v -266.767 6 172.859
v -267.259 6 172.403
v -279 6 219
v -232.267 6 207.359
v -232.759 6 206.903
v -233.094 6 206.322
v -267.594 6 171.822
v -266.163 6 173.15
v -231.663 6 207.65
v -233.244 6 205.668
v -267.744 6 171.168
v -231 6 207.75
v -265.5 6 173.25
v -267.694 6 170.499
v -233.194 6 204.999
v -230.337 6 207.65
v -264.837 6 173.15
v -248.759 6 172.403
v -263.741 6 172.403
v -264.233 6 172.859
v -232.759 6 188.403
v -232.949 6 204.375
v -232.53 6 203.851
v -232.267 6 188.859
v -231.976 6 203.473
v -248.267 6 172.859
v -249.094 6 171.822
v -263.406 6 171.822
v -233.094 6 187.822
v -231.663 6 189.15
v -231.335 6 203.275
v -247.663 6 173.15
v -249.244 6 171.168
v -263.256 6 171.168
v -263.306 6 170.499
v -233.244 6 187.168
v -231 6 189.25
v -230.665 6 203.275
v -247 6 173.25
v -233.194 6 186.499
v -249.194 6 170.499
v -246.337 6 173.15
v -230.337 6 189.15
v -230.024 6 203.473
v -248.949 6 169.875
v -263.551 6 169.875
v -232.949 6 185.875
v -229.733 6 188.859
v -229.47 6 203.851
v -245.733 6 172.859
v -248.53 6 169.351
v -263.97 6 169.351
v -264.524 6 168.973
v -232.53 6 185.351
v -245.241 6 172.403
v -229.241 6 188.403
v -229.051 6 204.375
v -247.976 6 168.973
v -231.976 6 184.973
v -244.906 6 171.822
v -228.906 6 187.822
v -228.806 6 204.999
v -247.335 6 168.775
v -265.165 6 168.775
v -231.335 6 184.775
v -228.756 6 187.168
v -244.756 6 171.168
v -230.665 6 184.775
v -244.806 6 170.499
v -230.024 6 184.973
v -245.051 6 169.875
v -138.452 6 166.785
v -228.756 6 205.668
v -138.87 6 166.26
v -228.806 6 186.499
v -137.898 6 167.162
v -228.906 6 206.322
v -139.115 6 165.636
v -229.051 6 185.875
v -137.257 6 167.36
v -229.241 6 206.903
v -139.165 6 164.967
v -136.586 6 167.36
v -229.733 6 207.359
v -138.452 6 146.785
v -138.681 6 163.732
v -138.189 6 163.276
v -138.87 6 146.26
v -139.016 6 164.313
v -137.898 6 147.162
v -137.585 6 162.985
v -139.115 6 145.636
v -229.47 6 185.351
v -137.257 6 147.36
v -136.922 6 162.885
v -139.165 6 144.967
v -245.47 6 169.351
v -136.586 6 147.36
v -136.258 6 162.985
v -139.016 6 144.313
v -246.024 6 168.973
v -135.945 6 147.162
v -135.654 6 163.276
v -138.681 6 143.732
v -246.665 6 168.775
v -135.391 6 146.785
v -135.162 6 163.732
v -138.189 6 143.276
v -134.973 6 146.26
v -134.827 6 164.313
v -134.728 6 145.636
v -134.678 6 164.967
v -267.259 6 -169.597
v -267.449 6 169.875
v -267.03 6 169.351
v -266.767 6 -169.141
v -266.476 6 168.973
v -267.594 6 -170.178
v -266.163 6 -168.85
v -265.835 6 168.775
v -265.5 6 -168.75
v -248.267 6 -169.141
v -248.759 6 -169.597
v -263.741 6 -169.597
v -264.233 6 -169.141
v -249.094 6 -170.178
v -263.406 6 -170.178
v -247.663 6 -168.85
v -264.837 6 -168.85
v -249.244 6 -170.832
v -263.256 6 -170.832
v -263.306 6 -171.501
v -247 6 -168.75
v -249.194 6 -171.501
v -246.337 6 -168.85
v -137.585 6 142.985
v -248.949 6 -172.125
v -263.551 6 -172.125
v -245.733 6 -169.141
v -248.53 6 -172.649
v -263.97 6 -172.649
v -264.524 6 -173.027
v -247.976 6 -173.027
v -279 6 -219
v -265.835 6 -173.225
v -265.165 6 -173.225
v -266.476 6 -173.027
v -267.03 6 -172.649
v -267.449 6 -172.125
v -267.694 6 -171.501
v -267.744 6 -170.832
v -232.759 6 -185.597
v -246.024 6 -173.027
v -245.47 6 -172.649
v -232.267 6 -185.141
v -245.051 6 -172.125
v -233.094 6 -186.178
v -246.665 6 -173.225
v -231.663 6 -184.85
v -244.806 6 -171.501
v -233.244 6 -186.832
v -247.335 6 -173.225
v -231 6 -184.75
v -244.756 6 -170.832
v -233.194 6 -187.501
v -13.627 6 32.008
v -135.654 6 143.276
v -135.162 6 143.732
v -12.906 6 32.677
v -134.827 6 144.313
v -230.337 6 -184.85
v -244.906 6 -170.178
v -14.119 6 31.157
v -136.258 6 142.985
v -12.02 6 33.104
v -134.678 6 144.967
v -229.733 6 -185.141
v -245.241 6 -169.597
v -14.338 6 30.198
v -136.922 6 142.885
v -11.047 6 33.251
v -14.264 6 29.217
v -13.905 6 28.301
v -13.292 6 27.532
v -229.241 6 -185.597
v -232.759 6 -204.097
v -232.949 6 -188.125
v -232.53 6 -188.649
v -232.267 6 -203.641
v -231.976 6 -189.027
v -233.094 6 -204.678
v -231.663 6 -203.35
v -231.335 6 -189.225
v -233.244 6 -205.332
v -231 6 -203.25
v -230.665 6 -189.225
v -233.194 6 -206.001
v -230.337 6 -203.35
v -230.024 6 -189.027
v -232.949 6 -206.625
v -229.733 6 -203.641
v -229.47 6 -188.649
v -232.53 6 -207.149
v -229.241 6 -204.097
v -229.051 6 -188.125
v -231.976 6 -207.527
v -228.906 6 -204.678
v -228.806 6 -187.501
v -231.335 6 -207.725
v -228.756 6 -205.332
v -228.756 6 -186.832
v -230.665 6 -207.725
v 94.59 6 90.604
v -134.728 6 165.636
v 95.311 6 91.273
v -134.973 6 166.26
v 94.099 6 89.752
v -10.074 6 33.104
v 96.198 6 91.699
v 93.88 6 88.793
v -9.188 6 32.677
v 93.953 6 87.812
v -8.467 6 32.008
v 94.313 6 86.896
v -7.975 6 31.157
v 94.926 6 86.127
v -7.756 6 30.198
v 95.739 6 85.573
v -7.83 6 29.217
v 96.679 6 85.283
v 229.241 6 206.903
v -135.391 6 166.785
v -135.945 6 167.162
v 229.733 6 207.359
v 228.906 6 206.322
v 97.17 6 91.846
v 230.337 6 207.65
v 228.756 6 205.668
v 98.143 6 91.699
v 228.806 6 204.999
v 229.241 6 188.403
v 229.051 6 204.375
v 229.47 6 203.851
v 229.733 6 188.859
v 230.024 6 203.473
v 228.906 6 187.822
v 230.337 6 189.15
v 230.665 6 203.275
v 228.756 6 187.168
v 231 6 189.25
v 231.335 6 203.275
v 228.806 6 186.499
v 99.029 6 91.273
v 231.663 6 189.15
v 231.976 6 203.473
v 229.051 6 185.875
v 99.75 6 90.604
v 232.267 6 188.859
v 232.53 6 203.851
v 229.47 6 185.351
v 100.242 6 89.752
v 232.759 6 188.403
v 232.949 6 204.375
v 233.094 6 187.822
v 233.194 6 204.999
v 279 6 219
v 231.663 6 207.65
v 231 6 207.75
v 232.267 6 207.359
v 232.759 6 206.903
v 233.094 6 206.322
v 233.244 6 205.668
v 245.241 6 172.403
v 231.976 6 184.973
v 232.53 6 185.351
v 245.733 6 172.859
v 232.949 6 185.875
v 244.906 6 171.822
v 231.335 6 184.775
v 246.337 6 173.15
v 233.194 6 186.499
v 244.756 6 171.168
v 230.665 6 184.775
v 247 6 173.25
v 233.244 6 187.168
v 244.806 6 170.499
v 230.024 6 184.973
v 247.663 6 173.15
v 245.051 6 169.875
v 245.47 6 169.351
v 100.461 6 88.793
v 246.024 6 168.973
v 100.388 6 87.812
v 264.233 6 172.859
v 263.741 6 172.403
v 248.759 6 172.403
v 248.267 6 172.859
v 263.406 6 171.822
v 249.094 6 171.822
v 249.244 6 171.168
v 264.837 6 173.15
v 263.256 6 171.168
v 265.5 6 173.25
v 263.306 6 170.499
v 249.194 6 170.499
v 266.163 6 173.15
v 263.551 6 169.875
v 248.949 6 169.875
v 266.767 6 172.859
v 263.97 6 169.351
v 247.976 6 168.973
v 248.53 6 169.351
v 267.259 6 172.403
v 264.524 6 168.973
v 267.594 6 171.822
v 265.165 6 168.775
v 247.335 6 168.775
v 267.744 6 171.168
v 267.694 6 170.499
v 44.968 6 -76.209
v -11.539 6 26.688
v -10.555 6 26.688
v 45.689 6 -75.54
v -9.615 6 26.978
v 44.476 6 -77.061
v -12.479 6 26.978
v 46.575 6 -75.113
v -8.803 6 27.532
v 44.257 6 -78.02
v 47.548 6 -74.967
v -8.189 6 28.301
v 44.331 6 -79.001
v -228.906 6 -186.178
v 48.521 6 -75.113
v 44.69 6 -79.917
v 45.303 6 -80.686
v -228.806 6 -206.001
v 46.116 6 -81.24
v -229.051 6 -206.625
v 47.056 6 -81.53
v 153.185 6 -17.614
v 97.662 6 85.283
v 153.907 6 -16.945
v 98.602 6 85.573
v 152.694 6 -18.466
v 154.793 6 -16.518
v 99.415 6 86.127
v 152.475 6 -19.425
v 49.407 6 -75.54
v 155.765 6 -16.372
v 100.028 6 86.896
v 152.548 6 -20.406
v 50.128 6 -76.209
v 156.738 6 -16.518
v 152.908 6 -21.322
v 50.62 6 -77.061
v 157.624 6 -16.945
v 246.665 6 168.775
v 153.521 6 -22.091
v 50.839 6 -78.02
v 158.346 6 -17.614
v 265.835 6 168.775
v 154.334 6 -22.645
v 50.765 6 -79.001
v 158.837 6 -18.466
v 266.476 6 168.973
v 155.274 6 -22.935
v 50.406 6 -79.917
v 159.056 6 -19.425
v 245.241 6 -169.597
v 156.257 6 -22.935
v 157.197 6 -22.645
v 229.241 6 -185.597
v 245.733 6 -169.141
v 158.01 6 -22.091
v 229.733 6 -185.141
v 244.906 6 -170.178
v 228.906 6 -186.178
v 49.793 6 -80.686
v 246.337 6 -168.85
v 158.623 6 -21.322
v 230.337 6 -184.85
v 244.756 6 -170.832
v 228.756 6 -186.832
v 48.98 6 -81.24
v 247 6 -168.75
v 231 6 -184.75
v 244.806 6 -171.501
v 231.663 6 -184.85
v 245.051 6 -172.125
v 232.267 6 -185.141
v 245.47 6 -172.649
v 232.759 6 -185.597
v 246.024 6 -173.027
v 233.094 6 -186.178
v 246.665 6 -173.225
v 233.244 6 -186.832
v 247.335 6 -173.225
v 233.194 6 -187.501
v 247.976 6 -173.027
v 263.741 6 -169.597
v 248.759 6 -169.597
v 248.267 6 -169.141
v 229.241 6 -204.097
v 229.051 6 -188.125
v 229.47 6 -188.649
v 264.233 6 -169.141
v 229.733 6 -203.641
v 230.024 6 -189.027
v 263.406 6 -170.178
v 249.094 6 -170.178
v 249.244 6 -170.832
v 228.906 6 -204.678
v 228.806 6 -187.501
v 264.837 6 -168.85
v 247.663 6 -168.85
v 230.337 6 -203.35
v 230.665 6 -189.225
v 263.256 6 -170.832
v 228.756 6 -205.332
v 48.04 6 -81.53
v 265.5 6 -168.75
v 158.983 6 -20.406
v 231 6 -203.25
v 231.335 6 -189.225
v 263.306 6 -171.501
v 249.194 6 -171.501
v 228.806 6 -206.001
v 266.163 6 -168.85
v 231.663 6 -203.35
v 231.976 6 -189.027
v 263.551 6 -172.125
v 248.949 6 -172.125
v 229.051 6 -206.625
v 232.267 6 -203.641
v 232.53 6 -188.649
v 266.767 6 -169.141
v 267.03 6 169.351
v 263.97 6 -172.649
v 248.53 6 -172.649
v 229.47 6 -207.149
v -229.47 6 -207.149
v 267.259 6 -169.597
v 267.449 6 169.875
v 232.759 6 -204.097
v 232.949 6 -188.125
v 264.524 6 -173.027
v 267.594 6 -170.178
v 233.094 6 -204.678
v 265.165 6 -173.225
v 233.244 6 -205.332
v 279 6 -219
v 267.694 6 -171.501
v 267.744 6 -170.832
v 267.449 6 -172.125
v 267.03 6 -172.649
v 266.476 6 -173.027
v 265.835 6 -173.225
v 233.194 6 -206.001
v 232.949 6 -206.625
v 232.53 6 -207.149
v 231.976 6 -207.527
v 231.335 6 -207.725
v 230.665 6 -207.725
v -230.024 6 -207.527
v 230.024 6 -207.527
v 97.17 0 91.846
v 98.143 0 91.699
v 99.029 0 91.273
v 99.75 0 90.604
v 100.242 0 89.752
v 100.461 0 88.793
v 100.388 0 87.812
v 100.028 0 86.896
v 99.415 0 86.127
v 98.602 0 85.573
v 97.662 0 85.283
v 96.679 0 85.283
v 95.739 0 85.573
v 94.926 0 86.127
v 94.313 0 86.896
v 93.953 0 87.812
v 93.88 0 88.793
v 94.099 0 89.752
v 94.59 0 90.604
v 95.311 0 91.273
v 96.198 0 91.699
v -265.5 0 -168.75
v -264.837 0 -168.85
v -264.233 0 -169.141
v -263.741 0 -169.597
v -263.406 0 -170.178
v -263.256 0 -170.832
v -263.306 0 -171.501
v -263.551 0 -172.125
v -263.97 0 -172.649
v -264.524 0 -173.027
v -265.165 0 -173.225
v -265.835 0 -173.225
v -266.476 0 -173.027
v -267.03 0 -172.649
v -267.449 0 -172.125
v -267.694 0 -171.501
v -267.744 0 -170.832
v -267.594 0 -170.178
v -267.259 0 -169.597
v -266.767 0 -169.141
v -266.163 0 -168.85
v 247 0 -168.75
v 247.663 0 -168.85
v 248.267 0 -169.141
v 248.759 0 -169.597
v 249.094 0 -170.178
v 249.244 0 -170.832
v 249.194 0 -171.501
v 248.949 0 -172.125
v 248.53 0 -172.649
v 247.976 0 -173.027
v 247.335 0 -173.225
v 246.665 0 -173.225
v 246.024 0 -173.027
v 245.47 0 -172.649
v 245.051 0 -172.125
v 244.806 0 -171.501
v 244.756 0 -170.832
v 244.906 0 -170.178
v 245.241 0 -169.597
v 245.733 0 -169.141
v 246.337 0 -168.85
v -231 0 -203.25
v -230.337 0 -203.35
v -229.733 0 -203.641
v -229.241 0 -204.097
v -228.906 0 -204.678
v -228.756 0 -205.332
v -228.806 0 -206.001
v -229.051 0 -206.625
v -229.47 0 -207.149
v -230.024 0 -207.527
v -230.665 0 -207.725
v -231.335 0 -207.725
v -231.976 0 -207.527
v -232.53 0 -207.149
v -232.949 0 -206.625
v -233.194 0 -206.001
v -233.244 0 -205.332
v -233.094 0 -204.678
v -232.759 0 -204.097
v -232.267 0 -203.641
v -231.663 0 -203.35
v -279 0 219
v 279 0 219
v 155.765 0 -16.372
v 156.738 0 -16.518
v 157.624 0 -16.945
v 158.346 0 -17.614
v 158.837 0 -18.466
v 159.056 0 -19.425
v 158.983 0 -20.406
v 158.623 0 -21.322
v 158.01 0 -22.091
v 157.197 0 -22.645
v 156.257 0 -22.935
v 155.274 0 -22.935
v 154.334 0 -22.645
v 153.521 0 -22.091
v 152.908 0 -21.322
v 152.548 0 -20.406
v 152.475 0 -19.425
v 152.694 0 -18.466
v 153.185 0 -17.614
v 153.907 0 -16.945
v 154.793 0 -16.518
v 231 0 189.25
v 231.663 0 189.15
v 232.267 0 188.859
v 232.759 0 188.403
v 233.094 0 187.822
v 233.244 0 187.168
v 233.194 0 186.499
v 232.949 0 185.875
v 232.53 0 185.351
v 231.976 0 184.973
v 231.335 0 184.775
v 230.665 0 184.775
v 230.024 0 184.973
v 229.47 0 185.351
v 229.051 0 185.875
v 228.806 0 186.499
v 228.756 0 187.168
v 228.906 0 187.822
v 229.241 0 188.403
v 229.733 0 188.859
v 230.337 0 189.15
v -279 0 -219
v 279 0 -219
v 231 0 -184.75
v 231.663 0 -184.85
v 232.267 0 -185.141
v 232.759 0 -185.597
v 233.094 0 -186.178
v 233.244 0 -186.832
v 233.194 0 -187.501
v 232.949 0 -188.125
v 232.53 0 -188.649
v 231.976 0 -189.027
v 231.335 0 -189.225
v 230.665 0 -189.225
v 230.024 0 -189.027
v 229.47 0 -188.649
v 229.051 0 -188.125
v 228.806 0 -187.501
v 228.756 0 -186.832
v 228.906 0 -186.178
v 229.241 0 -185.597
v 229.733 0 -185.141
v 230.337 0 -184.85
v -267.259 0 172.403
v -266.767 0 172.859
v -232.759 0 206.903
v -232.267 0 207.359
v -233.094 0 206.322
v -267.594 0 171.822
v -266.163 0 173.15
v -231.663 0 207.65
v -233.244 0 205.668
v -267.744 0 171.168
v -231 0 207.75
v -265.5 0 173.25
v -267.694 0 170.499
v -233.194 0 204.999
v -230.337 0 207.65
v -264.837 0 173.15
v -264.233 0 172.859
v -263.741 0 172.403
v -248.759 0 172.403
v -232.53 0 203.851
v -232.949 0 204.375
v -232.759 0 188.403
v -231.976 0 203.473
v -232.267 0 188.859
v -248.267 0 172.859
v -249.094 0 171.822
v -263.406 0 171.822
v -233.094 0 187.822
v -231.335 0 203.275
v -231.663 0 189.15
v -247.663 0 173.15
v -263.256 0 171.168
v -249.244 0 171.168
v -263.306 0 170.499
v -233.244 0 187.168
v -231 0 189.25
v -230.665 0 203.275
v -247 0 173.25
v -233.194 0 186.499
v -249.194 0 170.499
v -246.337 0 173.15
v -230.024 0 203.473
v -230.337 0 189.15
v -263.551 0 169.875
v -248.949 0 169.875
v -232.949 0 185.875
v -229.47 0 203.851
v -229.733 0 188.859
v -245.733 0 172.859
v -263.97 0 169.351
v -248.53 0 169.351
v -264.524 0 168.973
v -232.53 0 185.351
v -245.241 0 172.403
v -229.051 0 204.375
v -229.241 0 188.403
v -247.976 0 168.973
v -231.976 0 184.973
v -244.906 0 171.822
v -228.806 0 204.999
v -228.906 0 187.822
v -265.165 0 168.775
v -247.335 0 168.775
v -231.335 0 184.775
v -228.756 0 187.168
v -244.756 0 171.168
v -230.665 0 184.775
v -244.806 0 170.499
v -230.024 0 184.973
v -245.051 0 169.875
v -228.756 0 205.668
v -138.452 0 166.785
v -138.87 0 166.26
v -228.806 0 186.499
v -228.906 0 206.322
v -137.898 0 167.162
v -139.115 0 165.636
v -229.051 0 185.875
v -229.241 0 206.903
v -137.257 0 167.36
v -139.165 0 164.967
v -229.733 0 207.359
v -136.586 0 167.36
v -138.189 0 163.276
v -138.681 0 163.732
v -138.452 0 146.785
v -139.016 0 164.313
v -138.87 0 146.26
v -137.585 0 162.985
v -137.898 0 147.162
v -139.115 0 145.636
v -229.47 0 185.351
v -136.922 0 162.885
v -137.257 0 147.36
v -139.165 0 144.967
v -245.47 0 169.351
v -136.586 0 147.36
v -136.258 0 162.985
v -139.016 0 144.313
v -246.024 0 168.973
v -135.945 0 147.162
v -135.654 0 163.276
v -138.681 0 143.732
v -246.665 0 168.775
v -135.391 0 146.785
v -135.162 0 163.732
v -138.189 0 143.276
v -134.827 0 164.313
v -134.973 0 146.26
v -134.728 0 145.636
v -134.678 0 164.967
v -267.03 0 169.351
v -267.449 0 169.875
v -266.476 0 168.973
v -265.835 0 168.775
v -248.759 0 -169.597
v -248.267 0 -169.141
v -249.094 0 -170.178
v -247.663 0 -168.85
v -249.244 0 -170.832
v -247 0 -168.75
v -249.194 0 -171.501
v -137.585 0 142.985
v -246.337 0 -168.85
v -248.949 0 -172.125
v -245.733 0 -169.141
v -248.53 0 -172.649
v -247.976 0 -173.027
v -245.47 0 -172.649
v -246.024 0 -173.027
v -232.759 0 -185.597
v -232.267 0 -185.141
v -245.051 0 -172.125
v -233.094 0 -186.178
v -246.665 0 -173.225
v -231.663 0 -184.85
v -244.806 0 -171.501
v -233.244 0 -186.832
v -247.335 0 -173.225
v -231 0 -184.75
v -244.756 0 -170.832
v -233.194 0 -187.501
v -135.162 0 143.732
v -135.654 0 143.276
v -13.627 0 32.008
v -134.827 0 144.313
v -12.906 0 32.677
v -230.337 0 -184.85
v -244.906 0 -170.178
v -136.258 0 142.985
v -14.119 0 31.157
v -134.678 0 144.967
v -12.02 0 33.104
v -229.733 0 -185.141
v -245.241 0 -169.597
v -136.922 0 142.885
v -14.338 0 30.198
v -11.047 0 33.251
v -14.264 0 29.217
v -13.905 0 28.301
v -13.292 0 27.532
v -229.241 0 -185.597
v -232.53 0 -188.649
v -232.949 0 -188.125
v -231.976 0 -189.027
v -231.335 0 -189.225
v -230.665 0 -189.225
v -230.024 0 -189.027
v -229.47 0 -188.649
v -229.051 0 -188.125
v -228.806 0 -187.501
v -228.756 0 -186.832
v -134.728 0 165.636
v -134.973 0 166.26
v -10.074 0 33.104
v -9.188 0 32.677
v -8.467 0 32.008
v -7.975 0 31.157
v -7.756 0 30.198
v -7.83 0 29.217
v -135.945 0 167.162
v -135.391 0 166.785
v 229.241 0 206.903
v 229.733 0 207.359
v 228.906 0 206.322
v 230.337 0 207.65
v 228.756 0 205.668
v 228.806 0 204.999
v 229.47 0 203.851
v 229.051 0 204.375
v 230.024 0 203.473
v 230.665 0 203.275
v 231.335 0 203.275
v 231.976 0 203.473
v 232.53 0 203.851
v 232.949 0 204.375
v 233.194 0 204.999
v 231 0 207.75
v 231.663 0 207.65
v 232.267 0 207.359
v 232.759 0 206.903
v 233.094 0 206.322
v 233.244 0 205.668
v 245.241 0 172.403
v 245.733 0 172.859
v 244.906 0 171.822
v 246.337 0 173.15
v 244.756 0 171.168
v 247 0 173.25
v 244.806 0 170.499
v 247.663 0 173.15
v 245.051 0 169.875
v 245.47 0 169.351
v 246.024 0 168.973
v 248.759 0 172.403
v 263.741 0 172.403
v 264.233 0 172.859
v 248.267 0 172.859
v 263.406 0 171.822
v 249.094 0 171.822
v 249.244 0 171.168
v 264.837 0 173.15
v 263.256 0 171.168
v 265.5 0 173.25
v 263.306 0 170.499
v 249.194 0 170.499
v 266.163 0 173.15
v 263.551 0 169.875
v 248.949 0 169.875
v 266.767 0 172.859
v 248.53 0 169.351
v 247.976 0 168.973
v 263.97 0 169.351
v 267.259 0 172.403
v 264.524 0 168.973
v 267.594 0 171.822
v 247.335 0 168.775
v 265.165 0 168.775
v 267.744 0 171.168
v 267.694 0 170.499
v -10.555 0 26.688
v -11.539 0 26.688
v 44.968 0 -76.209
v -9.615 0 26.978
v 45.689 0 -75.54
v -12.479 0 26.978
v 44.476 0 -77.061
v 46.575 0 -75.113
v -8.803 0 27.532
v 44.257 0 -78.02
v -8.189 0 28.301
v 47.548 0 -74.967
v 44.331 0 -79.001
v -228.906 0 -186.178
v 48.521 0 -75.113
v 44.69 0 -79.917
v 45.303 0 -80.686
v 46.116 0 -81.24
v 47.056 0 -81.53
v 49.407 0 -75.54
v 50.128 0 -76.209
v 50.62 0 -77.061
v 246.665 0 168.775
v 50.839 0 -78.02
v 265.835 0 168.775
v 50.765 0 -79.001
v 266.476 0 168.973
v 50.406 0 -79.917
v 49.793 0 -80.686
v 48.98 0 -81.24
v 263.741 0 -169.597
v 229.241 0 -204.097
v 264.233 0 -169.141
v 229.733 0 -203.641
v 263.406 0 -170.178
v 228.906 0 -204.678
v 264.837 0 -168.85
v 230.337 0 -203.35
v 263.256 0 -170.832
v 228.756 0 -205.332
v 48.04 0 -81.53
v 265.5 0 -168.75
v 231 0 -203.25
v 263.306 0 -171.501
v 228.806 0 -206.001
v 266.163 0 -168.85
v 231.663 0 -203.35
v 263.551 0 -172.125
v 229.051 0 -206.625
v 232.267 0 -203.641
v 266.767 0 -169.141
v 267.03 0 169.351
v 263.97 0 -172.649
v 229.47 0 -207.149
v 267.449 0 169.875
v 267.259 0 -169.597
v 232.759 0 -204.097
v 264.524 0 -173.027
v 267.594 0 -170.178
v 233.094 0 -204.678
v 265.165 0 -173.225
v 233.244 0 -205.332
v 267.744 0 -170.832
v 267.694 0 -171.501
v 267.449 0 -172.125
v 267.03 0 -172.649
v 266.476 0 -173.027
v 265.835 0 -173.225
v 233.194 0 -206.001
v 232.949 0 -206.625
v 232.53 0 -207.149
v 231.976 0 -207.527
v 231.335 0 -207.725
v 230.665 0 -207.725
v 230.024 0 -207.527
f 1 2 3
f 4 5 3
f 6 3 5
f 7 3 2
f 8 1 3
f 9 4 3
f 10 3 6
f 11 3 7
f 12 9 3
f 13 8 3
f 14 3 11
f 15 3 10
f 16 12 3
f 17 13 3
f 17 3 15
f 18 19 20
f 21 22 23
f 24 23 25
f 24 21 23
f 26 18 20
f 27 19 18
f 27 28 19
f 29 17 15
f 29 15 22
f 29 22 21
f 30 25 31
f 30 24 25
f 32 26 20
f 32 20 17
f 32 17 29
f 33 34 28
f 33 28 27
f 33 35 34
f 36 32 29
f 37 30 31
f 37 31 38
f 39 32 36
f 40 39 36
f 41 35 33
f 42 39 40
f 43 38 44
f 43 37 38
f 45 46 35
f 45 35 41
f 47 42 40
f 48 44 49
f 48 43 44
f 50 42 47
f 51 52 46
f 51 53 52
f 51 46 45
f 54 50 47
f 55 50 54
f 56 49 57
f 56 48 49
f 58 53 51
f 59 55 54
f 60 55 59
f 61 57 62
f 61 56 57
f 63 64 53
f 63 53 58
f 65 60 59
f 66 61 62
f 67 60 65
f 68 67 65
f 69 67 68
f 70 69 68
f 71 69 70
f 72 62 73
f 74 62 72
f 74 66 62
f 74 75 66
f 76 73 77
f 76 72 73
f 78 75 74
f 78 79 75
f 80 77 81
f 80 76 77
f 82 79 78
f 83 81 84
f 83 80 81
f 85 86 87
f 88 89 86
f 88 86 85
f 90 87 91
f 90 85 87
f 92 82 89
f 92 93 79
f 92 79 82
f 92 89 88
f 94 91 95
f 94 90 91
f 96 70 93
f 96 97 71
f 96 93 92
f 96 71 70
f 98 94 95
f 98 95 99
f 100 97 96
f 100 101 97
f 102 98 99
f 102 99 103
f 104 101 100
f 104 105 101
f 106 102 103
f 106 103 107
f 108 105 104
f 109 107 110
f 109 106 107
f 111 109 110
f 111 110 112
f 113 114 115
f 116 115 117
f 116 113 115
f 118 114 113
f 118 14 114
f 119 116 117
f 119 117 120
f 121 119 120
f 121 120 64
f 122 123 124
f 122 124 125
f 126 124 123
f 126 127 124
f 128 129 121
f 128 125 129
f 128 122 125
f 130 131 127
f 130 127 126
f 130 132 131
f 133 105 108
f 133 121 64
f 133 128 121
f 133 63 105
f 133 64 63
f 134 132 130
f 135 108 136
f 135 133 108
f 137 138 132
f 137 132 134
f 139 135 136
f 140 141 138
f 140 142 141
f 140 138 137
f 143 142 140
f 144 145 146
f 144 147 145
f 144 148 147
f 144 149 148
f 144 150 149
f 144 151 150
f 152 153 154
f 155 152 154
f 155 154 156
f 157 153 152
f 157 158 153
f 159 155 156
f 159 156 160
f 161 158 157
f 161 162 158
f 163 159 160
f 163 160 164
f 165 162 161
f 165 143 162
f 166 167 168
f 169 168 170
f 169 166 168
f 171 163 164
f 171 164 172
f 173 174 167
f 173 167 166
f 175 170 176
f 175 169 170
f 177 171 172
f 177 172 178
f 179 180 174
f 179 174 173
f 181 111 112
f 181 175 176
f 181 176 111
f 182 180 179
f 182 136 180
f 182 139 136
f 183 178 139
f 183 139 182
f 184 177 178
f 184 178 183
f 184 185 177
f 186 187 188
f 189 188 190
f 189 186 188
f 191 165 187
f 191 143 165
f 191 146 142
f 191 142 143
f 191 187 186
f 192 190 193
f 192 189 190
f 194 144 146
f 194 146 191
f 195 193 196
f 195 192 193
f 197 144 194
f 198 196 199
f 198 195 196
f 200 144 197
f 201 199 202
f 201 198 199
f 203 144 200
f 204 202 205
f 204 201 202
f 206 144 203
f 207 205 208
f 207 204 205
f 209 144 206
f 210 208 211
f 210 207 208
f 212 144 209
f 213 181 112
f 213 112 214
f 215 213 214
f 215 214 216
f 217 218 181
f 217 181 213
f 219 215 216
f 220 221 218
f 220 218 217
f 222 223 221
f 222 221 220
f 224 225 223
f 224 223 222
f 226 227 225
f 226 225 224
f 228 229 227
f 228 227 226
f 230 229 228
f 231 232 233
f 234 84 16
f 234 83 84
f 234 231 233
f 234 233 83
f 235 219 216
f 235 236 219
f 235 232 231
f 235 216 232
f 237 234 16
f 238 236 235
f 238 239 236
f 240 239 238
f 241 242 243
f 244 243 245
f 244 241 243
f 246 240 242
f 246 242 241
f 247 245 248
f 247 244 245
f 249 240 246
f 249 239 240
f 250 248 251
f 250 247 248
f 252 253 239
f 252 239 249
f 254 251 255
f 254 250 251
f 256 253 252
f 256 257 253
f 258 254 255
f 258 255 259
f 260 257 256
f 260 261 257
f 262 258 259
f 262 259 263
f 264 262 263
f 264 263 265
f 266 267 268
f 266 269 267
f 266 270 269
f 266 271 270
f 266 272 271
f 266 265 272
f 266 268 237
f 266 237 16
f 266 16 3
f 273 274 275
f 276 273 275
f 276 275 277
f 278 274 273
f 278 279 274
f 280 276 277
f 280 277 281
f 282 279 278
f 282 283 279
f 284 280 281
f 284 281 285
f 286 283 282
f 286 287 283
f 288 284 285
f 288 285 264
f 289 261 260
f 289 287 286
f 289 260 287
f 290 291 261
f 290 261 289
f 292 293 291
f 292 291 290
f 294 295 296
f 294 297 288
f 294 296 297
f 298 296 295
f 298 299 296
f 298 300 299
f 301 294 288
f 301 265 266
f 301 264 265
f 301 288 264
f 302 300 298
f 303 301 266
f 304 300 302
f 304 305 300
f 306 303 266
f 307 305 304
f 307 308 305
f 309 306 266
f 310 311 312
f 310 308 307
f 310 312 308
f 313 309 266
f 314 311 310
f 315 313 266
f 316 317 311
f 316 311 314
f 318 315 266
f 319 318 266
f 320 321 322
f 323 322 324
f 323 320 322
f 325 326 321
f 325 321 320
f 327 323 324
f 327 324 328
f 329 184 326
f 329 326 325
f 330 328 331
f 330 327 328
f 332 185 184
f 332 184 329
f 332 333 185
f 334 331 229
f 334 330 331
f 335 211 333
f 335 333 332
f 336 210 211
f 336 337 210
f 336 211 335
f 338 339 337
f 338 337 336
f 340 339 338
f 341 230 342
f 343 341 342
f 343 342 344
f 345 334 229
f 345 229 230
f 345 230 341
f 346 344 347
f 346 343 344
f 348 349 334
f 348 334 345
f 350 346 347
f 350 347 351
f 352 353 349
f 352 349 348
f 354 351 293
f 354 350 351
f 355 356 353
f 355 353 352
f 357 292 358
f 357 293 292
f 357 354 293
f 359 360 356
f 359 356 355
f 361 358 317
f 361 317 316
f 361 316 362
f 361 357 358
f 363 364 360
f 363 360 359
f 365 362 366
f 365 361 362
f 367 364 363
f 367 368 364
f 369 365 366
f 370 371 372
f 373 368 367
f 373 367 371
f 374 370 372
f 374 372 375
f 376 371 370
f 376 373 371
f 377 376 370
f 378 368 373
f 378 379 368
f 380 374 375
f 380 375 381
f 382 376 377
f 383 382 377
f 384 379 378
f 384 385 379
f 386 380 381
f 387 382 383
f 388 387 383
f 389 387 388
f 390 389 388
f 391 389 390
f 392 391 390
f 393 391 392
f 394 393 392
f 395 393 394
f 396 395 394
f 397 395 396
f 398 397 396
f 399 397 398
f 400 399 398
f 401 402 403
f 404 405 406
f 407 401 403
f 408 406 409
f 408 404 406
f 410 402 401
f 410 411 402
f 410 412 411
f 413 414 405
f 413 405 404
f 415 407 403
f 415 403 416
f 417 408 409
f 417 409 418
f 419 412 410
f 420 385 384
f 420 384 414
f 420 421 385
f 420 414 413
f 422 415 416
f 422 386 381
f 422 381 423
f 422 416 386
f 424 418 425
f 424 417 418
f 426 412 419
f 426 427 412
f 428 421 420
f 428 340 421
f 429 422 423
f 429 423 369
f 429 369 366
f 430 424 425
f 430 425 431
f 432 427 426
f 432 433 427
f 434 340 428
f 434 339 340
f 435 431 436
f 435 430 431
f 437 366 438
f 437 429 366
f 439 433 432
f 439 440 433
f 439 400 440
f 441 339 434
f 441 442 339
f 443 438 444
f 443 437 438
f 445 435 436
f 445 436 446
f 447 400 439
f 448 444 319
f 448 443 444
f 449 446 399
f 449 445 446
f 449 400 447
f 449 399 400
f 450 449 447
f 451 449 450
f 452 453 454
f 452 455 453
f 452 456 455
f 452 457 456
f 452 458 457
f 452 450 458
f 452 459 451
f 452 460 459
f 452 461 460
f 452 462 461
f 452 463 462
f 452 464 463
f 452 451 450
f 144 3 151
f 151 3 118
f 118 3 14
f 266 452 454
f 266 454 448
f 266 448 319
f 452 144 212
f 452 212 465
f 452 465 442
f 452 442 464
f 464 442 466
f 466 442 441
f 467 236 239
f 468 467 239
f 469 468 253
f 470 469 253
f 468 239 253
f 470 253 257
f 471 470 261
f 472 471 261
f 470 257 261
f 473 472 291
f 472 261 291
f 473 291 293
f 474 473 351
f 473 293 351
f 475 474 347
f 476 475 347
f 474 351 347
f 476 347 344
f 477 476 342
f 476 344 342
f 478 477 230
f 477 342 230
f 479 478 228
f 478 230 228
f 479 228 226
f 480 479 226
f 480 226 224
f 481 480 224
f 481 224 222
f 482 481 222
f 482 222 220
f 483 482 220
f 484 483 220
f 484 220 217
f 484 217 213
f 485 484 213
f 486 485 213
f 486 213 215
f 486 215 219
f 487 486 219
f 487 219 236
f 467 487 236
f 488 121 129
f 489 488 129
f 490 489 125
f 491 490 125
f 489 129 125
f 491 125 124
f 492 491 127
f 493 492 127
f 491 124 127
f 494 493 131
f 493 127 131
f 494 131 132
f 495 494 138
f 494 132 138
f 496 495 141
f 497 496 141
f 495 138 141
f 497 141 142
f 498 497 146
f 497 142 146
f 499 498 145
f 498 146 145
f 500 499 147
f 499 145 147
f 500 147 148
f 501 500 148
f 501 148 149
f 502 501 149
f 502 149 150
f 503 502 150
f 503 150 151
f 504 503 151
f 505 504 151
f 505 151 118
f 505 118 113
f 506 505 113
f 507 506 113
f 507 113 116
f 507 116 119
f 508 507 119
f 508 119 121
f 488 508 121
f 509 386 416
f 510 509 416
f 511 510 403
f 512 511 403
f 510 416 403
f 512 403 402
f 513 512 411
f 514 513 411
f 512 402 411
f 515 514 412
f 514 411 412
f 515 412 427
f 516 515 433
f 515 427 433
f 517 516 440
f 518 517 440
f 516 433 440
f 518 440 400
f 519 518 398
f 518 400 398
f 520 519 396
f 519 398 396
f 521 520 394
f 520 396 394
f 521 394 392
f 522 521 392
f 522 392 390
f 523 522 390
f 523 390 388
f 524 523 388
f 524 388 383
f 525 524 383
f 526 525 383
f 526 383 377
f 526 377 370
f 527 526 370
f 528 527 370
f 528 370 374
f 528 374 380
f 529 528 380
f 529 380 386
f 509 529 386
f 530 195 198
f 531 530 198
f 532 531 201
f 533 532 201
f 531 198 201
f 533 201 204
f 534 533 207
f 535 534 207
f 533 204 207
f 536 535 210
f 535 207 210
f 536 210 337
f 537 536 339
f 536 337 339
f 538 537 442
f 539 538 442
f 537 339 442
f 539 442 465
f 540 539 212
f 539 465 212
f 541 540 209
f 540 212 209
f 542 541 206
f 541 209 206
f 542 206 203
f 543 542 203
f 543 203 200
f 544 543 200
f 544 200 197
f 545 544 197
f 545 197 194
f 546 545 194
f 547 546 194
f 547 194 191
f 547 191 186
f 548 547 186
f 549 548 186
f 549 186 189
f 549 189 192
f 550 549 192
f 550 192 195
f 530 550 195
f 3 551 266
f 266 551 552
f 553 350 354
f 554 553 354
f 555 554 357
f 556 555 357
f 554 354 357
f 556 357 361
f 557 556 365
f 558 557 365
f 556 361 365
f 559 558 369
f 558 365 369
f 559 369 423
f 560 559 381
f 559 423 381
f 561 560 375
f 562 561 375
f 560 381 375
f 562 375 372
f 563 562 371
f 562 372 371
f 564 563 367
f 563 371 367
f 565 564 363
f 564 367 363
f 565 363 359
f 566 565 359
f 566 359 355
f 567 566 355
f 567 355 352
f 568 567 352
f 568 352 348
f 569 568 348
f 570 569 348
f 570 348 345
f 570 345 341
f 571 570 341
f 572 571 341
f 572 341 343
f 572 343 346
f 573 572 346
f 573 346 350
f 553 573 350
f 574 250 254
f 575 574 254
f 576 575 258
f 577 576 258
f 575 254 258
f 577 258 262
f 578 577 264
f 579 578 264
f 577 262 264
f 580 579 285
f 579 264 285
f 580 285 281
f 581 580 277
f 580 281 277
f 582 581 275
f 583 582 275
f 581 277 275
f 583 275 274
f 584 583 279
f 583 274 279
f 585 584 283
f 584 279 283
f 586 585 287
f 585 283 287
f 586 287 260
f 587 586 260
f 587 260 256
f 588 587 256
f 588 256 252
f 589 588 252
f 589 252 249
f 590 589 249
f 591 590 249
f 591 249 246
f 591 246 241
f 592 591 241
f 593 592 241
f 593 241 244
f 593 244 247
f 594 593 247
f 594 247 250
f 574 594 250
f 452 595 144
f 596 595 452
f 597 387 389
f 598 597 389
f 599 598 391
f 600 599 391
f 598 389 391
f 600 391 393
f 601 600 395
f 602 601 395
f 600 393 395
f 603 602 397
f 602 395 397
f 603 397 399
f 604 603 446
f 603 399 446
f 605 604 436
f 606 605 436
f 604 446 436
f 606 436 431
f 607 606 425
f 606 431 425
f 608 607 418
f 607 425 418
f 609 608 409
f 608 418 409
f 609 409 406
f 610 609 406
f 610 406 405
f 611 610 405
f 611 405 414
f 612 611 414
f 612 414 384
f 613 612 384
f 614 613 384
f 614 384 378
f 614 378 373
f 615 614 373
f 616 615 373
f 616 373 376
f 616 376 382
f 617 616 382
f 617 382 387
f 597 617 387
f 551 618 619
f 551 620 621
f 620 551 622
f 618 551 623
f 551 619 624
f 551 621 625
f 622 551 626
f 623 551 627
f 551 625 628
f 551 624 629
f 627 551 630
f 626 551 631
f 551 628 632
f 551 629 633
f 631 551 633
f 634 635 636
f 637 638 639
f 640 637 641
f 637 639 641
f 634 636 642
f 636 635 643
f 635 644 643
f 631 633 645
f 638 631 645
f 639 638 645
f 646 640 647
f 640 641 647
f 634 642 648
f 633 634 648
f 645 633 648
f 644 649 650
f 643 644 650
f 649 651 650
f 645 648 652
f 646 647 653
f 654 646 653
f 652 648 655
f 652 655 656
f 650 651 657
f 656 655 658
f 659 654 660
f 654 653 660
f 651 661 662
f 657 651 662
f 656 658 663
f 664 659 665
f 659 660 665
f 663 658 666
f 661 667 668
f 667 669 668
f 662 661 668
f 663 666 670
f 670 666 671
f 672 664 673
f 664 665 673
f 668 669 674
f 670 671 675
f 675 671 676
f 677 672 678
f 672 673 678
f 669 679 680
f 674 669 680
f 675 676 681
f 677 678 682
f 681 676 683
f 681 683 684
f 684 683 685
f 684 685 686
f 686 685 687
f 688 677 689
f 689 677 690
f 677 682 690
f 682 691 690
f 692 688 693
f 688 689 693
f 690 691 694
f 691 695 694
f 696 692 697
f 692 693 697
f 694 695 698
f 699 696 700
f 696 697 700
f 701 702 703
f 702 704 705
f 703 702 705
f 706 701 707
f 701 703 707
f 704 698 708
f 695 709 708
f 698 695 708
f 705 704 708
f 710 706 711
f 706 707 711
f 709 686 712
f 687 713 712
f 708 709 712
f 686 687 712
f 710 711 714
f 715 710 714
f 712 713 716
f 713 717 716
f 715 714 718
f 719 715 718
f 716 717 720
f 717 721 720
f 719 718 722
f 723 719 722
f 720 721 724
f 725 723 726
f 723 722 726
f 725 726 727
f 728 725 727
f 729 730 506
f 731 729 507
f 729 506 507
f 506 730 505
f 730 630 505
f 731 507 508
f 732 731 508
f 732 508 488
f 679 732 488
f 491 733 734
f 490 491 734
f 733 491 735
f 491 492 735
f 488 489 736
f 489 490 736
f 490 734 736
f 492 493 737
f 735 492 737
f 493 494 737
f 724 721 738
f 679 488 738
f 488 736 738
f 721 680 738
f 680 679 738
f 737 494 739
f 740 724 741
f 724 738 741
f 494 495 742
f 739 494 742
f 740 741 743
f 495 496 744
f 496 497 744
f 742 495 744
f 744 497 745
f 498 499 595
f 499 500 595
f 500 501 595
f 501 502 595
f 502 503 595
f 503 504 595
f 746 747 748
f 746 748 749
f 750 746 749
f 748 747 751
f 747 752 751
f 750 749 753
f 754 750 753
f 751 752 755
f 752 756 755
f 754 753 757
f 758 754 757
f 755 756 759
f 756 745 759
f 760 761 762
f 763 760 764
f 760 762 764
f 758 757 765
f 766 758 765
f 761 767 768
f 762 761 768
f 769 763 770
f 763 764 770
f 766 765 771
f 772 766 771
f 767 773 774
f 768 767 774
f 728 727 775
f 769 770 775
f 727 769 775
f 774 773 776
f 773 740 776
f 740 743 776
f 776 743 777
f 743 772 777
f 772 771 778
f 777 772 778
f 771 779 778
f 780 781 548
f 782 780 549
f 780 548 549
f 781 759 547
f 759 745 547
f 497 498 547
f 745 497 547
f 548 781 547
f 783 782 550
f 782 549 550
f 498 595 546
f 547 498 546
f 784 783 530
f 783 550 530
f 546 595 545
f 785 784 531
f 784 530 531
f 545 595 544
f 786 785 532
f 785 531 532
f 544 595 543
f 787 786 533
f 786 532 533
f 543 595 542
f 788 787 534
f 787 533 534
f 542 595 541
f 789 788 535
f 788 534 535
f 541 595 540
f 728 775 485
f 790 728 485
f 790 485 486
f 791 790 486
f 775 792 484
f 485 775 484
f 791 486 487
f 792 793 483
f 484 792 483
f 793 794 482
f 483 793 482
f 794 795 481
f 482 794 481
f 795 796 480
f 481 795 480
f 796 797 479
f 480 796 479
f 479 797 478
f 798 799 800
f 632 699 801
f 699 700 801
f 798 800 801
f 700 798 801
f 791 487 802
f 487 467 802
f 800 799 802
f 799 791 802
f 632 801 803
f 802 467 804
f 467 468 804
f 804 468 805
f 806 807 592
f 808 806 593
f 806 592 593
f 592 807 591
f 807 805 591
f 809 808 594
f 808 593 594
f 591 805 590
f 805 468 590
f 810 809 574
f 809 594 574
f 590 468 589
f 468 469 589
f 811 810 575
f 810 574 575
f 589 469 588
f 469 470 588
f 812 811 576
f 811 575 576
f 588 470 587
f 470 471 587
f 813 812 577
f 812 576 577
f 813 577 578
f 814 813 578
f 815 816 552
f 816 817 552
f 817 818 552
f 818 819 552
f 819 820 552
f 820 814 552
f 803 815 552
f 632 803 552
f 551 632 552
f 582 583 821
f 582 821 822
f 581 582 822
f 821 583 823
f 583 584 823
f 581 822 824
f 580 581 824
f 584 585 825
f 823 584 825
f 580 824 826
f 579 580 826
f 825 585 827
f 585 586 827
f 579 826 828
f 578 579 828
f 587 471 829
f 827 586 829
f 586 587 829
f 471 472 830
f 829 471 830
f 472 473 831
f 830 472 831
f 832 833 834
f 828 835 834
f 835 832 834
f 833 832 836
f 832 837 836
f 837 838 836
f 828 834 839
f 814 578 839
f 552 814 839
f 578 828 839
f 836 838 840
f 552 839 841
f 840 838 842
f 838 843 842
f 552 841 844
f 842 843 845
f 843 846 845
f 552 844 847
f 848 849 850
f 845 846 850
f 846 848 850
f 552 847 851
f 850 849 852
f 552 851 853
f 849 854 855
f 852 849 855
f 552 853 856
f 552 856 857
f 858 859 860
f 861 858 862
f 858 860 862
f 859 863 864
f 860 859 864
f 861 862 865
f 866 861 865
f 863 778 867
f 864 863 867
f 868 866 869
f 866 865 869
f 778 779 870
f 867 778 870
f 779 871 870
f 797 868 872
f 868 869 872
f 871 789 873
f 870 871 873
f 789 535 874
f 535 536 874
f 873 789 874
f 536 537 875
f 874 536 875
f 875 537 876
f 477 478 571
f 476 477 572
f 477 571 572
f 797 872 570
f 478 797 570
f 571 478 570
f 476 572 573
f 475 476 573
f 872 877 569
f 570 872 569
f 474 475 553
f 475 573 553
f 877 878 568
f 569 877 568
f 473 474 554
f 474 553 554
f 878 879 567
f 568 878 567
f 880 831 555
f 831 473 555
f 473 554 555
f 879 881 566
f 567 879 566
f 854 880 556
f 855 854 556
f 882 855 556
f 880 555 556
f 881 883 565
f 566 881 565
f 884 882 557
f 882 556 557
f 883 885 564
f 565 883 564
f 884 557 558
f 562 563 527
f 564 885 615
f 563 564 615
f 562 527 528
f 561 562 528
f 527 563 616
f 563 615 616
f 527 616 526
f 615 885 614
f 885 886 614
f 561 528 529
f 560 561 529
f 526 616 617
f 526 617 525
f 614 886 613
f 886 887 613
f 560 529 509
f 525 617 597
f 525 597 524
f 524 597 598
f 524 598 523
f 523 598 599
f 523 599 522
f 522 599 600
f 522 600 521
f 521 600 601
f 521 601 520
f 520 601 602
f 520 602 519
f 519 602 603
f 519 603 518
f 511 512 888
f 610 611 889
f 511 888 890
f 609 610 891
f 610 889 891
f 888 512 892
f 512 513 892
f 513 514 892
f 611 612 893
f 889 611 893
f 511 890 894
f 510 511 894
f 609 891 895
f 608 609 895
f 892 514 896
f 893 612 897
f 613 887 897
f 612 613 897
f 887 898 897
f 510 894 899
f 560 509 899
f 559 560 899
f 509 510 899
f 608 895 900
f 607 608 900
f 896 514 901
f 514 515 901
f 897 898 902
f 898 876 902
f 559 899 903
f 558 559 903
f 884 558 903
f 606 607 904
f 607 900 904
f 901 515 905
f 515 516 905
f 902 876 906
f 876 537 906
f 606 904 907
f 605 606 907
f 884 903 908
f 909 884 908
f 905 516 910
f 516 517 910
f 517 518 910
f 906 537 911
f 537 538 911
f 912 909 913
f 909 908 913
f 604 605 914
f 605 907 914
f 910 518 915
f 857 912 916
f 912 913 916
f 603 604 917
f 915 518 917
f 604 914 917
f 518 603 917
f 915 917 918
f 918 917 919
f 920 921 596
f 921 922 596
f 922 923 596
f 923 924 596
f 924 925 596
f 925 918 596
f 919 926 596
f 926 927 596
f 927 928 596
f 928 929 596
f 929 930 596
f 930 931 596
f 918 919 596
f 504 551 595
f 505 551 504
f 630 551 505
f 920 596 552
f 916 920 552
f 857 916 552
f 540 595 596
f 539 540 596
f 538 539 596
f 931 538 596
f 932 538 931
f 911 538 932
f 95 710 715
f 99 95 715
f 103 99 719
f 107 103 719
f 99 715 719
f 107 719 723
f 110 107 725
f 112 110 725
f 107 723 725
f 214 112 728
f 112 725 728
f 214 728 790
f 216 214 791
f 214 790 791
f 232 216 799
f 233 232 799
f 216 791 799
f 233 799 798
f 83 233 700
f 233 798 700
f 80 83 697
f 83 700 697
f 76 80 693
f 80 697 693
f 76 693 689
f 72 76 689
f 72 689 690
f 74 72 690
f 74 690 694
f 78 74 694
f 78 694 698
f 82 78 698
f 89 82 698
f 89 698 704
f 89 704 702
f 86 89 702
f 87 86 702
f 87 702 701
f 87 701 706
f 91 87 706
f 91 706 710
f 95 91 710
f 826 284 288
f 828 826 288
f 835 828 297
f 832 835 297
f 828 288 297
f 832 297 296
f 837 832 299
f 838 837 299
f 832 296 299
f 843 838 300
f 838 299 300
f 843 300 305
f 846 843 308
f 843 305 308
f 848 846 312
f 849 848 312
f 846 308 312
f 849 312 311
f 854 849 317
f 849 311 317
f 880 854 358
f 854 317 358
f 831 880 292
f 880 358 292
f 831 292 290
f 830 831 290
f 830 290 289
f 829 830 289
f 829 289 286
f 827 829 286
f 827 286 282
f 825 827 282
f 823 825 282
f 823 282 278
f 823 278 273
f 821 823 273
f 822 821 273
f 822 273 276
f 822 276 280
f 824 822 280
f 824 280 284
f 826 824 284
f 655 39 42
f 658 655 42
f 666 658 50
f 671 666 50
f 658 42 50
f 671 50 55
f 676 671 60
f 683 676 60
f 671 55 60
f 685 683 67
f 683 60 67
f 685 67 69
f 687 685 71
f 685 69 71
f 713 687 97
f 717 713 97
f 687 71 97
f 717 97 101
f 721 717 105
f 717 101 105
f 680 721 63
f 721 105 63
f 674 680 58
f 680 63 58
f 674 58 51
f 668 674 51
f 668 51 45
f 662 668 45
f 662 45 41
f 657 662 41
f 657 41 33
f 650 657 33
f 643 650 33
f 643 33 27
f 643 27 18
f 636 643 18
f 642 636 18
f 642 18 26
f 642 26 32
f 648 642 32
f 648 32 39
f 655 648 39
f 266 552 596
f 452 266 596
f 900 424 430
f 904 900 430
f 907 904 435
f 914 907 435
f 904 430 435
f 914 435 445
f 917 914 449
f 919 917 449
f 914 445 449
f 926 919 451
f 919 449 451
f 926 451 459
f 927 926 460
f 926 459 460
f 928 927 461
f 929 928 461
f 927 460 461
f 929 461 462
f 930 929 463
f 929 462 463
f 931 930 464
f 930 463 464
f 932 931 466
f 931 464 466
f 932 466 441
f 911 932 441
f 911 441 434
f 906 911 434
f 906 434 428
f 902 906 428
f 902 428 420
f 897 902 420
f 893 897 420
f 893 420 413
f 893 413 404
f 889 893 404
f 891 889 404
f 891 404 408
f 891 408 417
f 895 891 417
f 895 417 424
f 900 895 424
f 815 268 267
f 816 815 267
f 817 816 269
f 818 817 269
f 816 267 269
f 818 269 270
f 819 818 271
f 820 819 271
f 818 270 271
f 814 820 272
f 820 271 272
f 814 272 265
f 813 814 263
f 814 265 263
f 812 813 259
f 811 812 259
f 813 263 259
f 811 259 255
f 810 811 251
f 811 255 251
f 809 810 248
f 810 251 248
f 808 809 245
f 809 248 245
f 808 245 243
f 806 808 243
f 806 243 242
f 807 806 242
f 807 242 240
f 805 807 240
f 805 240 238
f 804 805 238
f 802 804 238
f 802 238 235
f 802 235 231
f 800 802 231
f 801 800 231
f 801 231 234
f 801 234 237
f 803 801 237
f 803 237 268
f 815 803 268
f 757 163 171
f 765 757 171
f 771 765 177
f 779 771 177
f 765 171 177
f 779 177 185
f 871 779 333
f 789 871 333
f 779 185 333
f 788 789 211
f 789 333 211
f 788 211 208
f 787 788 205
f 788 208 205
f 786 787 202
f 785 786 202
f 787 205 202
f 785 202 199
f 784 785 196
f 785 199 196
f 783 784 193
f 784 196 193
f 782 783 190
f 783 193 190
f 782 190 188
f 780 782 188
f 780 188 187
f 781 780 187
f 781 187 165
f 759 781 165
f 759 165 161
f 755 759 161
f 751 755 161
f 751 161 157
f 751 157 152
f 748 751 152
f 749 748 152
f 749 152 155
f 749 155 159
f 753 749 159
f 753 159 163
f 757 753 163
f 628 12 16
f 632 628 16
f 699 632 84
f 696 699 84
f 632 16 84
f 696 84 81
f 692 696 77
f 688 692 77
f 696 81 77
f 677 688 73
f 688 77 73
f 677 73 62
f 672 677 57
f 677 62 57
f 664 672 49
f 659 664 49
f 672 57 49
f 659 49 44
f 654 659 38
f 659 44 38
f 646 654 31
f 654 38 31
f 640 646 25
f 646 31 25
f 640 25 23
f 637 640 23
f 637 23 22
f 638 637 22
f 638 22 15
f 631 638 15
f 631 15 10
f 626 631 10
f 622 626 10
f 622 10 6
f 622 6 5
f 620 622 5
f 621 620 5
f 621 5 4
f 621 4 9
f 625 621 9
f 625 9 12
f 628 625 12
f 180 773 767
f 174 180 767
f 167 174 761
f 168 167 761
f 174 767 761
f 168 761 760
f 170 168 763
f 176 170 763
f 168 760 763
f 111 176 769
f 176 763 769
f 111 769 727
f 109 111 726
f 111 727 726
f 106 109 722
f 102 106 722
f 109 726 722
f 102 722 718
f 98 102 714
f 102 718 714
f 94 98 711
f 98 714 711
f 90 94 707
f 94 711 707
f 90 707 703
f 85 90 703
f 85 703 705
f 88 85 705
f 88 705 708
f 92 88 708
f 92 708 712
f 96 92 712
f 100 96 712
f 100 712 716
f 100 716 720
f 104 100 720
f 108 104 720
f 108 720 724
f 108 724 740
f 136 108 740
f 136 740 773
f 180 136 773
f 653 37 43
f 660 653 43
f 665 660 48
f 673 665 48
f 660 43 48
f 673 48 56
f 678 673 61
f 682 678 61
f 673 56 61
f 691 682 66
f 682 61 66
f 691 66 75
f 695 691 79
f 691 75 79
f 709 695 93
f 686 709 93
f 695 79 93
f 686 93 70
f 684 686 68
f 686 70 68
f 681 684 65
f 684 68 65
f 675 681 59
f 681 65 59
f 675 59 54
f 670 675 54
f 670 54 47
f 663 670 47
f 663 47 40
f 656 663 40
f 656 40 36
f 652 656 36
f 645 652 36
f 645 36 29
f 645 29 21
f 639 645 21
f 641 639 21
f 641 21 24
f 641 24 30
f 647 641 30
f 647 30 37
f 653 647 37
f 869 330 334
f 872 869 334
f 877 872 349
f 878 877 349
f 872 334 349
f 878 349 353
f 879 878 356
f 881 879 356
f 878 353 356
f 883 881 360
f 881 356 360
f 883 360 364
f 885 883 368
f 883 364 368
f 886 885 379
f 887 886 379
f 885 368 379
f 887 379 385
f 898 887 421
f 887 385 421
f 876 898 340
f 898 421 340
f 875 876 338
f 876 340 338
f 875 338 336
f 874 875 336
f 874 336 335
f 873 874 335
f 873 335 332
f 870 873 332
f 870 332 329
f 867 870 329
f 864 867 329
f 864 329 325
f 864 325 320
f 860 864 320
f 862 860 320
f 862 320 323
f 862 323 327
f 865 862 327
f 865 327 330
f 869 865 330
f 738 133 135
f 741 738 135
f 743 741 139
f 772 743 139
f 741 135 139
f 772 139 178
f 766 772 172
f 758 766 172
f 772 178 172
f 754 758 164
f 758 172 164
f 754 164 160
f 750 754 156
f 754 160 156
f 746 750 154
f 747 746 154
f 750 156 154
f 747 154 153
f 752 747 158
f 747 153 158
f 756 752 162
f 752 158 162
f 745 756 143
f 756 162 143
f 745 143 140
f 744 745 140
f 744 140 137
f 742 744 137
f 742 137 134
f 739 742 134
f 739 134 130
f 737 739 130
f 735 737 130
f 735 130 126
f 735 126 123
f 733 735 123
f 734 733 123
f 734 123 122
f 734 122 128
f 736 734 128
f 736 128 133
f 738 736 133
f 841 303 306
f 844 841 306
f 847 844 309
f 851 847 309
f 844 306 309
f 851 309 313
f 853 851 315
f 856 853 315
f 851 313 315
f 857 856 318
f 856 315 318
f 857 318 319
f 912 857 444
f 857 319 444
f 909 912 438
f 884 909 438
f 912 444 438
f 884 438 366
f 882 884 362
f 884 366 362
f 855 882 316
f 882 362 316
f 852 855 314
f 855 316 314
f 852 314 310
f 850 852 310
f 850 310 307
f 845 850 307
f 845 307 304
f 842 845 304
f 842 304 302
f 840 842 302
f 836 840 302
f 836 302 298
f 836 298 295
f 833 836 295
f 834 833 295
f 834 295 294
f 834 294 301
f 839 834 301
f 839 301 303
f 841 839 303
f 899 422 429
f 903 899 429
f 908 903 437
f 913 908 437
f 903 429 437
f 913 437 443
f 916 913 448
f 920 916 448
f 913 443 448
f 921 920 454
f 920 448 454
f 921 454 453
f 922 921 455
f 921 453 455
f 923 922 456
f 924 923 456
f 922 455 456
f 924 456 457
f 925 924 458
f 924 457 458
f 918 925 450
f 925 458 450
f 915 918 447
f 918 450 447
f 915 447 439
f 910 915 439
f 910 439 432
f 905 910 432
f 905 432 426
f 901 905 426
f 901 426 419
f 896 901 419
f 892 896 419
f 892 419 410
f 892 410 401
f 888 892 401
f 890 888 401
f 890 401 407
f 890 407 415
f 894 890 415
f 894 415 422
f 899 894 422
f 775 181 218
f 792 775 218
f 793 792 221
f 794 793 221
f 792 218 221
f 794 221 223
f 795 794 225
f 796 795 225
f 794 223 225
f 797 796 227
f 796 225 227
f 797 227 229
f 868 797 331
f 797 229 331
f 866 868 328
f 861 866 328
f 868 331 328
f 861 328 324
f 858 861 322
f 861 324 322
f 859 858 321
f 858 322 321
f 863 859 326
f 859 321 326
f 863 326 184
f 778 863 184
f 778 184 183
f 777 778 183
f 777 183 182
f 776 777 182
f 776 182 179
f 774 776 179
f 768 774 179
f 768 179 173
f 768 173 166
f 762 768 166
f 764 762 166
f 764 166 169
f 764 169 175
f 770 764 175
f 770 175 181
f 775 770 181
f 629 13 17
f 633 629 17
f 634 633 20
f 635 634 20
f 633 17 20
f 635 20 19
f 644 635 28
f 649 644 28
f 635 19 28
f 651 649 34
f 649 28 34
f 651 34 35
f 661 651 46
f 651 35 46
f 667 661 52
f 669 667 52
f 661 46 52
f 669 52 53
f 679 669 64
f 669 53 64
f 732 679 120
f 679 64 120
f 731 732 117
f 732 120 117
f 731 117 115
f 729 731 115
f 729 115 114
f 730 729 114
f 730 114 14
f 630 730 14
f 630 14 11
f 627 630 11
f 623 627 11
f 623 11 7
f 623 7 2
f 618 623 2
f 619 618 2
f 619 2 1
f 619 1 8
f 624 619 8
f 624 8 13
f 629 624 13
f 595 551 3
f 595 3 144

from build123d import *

# Parameters (mm, degrees)
SCHIZZO1_W                   = 558
SCHIZZO1_H                   = 438
ESTRUSIONE_ESTRUSIONE1_DEPTH = 6
SCHIZZO2_R                   = 2.25
TAGLIO_ESTRUSIONE1_DEPTH     = 10
SCHIZZO4_R                   = 3.3
TAGLIO_ESTRUSIONE2_DEPTH     = 10
SCHIZZO5_R                   = 2.25
TAGLIO_ESTRUSIONE3_DEPTH     = 10


with BuildPart() as part:
    # Schizzo1 → Estrusione-Estrusione1 (new body)
    with BuildSketch(Plane(origin=(0, 0, 0), x_dir=(1, 0, 0), z_dir=(0, 1, 0))):
        Rectangle(SCHIZZO1_W, SCHIZZO1_H)
    extrude(amount=ESTRUSIONE_ESTRUSIONE1_DEPTH)

    # Schizzo2 → Taglio-Estrusione1 (cut)
    with BuildSketch(Plane(origin=(0, 6, 0), x_dir=(1, 0, 0), z_dir=(0, 1, 0))):
        with Locations(Location((-231, 205.5, 0), (0, 0, 270))):
            Circle(SCHIZZO2_R)
        with Locations(Location((-231, 187, 0), (0, 0, 270))):
            Circle(SCHIZZO2_R)
        with Locations(Location((-247, 171, 0), (0, 0, 270))):
            Circle(SCHIZZO2_R)
        with Locations(Location((-265.5, 171, 0), (0, 0, 270))):
            Circle(SCHIZZO2_R)
        with Locations(Location((231, 205.5, 0), (0, 0, 270))):
            Circle(SCHIZZO2_R)
        with Locations(Location((231, 187, 0), (0, 0, 270))):
            Circle(SCHIZZO2_R)
        with Locations(Location((247, 171, 0), (0, 0, 270))):
            Circle(SCHIZZO2_R)
        with Locations(Location((265.5, 171, 0), (0, 0, 270))):
            Circle(SCHIZZO2_R)
        with Locations(Location((265.5, -171, 0), (0, 0, 270))):
            Circle(SCHIZZO2_R)
        with Locations(Location((247, -171, 0), (0, 0, 270))):
            Circle(SCHIZZO2_R)
        with Locations(Location((231, -187, 0), (0, 0, 270))):
            Circle(SCHIZZO2_R)
        with Locations(Location((231, -205.5, 0), (0, 0, 270))):
            Circle(SCHIZZO2_R)
        with Locations(Location((-231, -205.5, 0), (0, 0, 270))):
            Circle(SCHIZZO2_R)
        with Locations(Location((-231, -187, 0), (0, 0, 270))):
            Circle(SCHIZZO2_R)
        with Locations(Location((-247, -171, 0), (0, 0, 270))):
            Circle(SCHIZZO2_R)
        with Locations(Location((-265.5, -171, 0), (0, 0, 270))):
            Circle(SCHIZZO2_R)
    extrude(amount=-TAGLIO_ESTRUSIONE1_DEPTH, mode=Mode.SUBTRACT)

    # Schizzo4 → Taglio-Estrusione2 (cut)
    with BuildSketch(Plane(origin=(0, 6, 0), x_dir=(1, 0, 0), z_dir=(0, 1, 0))):
        with Locations(Location((-11.04713937, -29.950902322, 0), (0, 0, 270))):
            Circle(SCHIZZO4_R)
        with Locations(Location((97.170402481, -88.545989873, 0), (0, 0, 270))):
            Circle(SCHIZZO4_R)
        with Locations(Location((155.765489817, 19.671552094, 0), (0, 0, 270))):
            Circle(SCHIZZO4_R)
        with Locations(Location((47.547947967, 78.266639645, 0), (0, 0, 270))):
            Circle(SCHIZZO4_R)
    extrude(amount=-TAGLIO_ESTRUSIONE2_DEPTH, mode=Mode.SUBTRACT)

    # Schizzo5 → Taglio-Estrusione3 (cut)
    with BuildSketch(Plane.XZ):
        with Locations(Location((-136.921607377, 165.135242981, 0), (0, 0, 270))):
            Circle(SCHIZZO5_R)
        with Locations(Location((-136.921607377, 145.135242981, 0), (0, 0, 270))):
            Circle(SCHIZZO5_R)
    extrude(amount=-TAGLIO_ESTRUSIONE3_DEPTH, mode=Mode.SUBTRACT)


solid = part.part
